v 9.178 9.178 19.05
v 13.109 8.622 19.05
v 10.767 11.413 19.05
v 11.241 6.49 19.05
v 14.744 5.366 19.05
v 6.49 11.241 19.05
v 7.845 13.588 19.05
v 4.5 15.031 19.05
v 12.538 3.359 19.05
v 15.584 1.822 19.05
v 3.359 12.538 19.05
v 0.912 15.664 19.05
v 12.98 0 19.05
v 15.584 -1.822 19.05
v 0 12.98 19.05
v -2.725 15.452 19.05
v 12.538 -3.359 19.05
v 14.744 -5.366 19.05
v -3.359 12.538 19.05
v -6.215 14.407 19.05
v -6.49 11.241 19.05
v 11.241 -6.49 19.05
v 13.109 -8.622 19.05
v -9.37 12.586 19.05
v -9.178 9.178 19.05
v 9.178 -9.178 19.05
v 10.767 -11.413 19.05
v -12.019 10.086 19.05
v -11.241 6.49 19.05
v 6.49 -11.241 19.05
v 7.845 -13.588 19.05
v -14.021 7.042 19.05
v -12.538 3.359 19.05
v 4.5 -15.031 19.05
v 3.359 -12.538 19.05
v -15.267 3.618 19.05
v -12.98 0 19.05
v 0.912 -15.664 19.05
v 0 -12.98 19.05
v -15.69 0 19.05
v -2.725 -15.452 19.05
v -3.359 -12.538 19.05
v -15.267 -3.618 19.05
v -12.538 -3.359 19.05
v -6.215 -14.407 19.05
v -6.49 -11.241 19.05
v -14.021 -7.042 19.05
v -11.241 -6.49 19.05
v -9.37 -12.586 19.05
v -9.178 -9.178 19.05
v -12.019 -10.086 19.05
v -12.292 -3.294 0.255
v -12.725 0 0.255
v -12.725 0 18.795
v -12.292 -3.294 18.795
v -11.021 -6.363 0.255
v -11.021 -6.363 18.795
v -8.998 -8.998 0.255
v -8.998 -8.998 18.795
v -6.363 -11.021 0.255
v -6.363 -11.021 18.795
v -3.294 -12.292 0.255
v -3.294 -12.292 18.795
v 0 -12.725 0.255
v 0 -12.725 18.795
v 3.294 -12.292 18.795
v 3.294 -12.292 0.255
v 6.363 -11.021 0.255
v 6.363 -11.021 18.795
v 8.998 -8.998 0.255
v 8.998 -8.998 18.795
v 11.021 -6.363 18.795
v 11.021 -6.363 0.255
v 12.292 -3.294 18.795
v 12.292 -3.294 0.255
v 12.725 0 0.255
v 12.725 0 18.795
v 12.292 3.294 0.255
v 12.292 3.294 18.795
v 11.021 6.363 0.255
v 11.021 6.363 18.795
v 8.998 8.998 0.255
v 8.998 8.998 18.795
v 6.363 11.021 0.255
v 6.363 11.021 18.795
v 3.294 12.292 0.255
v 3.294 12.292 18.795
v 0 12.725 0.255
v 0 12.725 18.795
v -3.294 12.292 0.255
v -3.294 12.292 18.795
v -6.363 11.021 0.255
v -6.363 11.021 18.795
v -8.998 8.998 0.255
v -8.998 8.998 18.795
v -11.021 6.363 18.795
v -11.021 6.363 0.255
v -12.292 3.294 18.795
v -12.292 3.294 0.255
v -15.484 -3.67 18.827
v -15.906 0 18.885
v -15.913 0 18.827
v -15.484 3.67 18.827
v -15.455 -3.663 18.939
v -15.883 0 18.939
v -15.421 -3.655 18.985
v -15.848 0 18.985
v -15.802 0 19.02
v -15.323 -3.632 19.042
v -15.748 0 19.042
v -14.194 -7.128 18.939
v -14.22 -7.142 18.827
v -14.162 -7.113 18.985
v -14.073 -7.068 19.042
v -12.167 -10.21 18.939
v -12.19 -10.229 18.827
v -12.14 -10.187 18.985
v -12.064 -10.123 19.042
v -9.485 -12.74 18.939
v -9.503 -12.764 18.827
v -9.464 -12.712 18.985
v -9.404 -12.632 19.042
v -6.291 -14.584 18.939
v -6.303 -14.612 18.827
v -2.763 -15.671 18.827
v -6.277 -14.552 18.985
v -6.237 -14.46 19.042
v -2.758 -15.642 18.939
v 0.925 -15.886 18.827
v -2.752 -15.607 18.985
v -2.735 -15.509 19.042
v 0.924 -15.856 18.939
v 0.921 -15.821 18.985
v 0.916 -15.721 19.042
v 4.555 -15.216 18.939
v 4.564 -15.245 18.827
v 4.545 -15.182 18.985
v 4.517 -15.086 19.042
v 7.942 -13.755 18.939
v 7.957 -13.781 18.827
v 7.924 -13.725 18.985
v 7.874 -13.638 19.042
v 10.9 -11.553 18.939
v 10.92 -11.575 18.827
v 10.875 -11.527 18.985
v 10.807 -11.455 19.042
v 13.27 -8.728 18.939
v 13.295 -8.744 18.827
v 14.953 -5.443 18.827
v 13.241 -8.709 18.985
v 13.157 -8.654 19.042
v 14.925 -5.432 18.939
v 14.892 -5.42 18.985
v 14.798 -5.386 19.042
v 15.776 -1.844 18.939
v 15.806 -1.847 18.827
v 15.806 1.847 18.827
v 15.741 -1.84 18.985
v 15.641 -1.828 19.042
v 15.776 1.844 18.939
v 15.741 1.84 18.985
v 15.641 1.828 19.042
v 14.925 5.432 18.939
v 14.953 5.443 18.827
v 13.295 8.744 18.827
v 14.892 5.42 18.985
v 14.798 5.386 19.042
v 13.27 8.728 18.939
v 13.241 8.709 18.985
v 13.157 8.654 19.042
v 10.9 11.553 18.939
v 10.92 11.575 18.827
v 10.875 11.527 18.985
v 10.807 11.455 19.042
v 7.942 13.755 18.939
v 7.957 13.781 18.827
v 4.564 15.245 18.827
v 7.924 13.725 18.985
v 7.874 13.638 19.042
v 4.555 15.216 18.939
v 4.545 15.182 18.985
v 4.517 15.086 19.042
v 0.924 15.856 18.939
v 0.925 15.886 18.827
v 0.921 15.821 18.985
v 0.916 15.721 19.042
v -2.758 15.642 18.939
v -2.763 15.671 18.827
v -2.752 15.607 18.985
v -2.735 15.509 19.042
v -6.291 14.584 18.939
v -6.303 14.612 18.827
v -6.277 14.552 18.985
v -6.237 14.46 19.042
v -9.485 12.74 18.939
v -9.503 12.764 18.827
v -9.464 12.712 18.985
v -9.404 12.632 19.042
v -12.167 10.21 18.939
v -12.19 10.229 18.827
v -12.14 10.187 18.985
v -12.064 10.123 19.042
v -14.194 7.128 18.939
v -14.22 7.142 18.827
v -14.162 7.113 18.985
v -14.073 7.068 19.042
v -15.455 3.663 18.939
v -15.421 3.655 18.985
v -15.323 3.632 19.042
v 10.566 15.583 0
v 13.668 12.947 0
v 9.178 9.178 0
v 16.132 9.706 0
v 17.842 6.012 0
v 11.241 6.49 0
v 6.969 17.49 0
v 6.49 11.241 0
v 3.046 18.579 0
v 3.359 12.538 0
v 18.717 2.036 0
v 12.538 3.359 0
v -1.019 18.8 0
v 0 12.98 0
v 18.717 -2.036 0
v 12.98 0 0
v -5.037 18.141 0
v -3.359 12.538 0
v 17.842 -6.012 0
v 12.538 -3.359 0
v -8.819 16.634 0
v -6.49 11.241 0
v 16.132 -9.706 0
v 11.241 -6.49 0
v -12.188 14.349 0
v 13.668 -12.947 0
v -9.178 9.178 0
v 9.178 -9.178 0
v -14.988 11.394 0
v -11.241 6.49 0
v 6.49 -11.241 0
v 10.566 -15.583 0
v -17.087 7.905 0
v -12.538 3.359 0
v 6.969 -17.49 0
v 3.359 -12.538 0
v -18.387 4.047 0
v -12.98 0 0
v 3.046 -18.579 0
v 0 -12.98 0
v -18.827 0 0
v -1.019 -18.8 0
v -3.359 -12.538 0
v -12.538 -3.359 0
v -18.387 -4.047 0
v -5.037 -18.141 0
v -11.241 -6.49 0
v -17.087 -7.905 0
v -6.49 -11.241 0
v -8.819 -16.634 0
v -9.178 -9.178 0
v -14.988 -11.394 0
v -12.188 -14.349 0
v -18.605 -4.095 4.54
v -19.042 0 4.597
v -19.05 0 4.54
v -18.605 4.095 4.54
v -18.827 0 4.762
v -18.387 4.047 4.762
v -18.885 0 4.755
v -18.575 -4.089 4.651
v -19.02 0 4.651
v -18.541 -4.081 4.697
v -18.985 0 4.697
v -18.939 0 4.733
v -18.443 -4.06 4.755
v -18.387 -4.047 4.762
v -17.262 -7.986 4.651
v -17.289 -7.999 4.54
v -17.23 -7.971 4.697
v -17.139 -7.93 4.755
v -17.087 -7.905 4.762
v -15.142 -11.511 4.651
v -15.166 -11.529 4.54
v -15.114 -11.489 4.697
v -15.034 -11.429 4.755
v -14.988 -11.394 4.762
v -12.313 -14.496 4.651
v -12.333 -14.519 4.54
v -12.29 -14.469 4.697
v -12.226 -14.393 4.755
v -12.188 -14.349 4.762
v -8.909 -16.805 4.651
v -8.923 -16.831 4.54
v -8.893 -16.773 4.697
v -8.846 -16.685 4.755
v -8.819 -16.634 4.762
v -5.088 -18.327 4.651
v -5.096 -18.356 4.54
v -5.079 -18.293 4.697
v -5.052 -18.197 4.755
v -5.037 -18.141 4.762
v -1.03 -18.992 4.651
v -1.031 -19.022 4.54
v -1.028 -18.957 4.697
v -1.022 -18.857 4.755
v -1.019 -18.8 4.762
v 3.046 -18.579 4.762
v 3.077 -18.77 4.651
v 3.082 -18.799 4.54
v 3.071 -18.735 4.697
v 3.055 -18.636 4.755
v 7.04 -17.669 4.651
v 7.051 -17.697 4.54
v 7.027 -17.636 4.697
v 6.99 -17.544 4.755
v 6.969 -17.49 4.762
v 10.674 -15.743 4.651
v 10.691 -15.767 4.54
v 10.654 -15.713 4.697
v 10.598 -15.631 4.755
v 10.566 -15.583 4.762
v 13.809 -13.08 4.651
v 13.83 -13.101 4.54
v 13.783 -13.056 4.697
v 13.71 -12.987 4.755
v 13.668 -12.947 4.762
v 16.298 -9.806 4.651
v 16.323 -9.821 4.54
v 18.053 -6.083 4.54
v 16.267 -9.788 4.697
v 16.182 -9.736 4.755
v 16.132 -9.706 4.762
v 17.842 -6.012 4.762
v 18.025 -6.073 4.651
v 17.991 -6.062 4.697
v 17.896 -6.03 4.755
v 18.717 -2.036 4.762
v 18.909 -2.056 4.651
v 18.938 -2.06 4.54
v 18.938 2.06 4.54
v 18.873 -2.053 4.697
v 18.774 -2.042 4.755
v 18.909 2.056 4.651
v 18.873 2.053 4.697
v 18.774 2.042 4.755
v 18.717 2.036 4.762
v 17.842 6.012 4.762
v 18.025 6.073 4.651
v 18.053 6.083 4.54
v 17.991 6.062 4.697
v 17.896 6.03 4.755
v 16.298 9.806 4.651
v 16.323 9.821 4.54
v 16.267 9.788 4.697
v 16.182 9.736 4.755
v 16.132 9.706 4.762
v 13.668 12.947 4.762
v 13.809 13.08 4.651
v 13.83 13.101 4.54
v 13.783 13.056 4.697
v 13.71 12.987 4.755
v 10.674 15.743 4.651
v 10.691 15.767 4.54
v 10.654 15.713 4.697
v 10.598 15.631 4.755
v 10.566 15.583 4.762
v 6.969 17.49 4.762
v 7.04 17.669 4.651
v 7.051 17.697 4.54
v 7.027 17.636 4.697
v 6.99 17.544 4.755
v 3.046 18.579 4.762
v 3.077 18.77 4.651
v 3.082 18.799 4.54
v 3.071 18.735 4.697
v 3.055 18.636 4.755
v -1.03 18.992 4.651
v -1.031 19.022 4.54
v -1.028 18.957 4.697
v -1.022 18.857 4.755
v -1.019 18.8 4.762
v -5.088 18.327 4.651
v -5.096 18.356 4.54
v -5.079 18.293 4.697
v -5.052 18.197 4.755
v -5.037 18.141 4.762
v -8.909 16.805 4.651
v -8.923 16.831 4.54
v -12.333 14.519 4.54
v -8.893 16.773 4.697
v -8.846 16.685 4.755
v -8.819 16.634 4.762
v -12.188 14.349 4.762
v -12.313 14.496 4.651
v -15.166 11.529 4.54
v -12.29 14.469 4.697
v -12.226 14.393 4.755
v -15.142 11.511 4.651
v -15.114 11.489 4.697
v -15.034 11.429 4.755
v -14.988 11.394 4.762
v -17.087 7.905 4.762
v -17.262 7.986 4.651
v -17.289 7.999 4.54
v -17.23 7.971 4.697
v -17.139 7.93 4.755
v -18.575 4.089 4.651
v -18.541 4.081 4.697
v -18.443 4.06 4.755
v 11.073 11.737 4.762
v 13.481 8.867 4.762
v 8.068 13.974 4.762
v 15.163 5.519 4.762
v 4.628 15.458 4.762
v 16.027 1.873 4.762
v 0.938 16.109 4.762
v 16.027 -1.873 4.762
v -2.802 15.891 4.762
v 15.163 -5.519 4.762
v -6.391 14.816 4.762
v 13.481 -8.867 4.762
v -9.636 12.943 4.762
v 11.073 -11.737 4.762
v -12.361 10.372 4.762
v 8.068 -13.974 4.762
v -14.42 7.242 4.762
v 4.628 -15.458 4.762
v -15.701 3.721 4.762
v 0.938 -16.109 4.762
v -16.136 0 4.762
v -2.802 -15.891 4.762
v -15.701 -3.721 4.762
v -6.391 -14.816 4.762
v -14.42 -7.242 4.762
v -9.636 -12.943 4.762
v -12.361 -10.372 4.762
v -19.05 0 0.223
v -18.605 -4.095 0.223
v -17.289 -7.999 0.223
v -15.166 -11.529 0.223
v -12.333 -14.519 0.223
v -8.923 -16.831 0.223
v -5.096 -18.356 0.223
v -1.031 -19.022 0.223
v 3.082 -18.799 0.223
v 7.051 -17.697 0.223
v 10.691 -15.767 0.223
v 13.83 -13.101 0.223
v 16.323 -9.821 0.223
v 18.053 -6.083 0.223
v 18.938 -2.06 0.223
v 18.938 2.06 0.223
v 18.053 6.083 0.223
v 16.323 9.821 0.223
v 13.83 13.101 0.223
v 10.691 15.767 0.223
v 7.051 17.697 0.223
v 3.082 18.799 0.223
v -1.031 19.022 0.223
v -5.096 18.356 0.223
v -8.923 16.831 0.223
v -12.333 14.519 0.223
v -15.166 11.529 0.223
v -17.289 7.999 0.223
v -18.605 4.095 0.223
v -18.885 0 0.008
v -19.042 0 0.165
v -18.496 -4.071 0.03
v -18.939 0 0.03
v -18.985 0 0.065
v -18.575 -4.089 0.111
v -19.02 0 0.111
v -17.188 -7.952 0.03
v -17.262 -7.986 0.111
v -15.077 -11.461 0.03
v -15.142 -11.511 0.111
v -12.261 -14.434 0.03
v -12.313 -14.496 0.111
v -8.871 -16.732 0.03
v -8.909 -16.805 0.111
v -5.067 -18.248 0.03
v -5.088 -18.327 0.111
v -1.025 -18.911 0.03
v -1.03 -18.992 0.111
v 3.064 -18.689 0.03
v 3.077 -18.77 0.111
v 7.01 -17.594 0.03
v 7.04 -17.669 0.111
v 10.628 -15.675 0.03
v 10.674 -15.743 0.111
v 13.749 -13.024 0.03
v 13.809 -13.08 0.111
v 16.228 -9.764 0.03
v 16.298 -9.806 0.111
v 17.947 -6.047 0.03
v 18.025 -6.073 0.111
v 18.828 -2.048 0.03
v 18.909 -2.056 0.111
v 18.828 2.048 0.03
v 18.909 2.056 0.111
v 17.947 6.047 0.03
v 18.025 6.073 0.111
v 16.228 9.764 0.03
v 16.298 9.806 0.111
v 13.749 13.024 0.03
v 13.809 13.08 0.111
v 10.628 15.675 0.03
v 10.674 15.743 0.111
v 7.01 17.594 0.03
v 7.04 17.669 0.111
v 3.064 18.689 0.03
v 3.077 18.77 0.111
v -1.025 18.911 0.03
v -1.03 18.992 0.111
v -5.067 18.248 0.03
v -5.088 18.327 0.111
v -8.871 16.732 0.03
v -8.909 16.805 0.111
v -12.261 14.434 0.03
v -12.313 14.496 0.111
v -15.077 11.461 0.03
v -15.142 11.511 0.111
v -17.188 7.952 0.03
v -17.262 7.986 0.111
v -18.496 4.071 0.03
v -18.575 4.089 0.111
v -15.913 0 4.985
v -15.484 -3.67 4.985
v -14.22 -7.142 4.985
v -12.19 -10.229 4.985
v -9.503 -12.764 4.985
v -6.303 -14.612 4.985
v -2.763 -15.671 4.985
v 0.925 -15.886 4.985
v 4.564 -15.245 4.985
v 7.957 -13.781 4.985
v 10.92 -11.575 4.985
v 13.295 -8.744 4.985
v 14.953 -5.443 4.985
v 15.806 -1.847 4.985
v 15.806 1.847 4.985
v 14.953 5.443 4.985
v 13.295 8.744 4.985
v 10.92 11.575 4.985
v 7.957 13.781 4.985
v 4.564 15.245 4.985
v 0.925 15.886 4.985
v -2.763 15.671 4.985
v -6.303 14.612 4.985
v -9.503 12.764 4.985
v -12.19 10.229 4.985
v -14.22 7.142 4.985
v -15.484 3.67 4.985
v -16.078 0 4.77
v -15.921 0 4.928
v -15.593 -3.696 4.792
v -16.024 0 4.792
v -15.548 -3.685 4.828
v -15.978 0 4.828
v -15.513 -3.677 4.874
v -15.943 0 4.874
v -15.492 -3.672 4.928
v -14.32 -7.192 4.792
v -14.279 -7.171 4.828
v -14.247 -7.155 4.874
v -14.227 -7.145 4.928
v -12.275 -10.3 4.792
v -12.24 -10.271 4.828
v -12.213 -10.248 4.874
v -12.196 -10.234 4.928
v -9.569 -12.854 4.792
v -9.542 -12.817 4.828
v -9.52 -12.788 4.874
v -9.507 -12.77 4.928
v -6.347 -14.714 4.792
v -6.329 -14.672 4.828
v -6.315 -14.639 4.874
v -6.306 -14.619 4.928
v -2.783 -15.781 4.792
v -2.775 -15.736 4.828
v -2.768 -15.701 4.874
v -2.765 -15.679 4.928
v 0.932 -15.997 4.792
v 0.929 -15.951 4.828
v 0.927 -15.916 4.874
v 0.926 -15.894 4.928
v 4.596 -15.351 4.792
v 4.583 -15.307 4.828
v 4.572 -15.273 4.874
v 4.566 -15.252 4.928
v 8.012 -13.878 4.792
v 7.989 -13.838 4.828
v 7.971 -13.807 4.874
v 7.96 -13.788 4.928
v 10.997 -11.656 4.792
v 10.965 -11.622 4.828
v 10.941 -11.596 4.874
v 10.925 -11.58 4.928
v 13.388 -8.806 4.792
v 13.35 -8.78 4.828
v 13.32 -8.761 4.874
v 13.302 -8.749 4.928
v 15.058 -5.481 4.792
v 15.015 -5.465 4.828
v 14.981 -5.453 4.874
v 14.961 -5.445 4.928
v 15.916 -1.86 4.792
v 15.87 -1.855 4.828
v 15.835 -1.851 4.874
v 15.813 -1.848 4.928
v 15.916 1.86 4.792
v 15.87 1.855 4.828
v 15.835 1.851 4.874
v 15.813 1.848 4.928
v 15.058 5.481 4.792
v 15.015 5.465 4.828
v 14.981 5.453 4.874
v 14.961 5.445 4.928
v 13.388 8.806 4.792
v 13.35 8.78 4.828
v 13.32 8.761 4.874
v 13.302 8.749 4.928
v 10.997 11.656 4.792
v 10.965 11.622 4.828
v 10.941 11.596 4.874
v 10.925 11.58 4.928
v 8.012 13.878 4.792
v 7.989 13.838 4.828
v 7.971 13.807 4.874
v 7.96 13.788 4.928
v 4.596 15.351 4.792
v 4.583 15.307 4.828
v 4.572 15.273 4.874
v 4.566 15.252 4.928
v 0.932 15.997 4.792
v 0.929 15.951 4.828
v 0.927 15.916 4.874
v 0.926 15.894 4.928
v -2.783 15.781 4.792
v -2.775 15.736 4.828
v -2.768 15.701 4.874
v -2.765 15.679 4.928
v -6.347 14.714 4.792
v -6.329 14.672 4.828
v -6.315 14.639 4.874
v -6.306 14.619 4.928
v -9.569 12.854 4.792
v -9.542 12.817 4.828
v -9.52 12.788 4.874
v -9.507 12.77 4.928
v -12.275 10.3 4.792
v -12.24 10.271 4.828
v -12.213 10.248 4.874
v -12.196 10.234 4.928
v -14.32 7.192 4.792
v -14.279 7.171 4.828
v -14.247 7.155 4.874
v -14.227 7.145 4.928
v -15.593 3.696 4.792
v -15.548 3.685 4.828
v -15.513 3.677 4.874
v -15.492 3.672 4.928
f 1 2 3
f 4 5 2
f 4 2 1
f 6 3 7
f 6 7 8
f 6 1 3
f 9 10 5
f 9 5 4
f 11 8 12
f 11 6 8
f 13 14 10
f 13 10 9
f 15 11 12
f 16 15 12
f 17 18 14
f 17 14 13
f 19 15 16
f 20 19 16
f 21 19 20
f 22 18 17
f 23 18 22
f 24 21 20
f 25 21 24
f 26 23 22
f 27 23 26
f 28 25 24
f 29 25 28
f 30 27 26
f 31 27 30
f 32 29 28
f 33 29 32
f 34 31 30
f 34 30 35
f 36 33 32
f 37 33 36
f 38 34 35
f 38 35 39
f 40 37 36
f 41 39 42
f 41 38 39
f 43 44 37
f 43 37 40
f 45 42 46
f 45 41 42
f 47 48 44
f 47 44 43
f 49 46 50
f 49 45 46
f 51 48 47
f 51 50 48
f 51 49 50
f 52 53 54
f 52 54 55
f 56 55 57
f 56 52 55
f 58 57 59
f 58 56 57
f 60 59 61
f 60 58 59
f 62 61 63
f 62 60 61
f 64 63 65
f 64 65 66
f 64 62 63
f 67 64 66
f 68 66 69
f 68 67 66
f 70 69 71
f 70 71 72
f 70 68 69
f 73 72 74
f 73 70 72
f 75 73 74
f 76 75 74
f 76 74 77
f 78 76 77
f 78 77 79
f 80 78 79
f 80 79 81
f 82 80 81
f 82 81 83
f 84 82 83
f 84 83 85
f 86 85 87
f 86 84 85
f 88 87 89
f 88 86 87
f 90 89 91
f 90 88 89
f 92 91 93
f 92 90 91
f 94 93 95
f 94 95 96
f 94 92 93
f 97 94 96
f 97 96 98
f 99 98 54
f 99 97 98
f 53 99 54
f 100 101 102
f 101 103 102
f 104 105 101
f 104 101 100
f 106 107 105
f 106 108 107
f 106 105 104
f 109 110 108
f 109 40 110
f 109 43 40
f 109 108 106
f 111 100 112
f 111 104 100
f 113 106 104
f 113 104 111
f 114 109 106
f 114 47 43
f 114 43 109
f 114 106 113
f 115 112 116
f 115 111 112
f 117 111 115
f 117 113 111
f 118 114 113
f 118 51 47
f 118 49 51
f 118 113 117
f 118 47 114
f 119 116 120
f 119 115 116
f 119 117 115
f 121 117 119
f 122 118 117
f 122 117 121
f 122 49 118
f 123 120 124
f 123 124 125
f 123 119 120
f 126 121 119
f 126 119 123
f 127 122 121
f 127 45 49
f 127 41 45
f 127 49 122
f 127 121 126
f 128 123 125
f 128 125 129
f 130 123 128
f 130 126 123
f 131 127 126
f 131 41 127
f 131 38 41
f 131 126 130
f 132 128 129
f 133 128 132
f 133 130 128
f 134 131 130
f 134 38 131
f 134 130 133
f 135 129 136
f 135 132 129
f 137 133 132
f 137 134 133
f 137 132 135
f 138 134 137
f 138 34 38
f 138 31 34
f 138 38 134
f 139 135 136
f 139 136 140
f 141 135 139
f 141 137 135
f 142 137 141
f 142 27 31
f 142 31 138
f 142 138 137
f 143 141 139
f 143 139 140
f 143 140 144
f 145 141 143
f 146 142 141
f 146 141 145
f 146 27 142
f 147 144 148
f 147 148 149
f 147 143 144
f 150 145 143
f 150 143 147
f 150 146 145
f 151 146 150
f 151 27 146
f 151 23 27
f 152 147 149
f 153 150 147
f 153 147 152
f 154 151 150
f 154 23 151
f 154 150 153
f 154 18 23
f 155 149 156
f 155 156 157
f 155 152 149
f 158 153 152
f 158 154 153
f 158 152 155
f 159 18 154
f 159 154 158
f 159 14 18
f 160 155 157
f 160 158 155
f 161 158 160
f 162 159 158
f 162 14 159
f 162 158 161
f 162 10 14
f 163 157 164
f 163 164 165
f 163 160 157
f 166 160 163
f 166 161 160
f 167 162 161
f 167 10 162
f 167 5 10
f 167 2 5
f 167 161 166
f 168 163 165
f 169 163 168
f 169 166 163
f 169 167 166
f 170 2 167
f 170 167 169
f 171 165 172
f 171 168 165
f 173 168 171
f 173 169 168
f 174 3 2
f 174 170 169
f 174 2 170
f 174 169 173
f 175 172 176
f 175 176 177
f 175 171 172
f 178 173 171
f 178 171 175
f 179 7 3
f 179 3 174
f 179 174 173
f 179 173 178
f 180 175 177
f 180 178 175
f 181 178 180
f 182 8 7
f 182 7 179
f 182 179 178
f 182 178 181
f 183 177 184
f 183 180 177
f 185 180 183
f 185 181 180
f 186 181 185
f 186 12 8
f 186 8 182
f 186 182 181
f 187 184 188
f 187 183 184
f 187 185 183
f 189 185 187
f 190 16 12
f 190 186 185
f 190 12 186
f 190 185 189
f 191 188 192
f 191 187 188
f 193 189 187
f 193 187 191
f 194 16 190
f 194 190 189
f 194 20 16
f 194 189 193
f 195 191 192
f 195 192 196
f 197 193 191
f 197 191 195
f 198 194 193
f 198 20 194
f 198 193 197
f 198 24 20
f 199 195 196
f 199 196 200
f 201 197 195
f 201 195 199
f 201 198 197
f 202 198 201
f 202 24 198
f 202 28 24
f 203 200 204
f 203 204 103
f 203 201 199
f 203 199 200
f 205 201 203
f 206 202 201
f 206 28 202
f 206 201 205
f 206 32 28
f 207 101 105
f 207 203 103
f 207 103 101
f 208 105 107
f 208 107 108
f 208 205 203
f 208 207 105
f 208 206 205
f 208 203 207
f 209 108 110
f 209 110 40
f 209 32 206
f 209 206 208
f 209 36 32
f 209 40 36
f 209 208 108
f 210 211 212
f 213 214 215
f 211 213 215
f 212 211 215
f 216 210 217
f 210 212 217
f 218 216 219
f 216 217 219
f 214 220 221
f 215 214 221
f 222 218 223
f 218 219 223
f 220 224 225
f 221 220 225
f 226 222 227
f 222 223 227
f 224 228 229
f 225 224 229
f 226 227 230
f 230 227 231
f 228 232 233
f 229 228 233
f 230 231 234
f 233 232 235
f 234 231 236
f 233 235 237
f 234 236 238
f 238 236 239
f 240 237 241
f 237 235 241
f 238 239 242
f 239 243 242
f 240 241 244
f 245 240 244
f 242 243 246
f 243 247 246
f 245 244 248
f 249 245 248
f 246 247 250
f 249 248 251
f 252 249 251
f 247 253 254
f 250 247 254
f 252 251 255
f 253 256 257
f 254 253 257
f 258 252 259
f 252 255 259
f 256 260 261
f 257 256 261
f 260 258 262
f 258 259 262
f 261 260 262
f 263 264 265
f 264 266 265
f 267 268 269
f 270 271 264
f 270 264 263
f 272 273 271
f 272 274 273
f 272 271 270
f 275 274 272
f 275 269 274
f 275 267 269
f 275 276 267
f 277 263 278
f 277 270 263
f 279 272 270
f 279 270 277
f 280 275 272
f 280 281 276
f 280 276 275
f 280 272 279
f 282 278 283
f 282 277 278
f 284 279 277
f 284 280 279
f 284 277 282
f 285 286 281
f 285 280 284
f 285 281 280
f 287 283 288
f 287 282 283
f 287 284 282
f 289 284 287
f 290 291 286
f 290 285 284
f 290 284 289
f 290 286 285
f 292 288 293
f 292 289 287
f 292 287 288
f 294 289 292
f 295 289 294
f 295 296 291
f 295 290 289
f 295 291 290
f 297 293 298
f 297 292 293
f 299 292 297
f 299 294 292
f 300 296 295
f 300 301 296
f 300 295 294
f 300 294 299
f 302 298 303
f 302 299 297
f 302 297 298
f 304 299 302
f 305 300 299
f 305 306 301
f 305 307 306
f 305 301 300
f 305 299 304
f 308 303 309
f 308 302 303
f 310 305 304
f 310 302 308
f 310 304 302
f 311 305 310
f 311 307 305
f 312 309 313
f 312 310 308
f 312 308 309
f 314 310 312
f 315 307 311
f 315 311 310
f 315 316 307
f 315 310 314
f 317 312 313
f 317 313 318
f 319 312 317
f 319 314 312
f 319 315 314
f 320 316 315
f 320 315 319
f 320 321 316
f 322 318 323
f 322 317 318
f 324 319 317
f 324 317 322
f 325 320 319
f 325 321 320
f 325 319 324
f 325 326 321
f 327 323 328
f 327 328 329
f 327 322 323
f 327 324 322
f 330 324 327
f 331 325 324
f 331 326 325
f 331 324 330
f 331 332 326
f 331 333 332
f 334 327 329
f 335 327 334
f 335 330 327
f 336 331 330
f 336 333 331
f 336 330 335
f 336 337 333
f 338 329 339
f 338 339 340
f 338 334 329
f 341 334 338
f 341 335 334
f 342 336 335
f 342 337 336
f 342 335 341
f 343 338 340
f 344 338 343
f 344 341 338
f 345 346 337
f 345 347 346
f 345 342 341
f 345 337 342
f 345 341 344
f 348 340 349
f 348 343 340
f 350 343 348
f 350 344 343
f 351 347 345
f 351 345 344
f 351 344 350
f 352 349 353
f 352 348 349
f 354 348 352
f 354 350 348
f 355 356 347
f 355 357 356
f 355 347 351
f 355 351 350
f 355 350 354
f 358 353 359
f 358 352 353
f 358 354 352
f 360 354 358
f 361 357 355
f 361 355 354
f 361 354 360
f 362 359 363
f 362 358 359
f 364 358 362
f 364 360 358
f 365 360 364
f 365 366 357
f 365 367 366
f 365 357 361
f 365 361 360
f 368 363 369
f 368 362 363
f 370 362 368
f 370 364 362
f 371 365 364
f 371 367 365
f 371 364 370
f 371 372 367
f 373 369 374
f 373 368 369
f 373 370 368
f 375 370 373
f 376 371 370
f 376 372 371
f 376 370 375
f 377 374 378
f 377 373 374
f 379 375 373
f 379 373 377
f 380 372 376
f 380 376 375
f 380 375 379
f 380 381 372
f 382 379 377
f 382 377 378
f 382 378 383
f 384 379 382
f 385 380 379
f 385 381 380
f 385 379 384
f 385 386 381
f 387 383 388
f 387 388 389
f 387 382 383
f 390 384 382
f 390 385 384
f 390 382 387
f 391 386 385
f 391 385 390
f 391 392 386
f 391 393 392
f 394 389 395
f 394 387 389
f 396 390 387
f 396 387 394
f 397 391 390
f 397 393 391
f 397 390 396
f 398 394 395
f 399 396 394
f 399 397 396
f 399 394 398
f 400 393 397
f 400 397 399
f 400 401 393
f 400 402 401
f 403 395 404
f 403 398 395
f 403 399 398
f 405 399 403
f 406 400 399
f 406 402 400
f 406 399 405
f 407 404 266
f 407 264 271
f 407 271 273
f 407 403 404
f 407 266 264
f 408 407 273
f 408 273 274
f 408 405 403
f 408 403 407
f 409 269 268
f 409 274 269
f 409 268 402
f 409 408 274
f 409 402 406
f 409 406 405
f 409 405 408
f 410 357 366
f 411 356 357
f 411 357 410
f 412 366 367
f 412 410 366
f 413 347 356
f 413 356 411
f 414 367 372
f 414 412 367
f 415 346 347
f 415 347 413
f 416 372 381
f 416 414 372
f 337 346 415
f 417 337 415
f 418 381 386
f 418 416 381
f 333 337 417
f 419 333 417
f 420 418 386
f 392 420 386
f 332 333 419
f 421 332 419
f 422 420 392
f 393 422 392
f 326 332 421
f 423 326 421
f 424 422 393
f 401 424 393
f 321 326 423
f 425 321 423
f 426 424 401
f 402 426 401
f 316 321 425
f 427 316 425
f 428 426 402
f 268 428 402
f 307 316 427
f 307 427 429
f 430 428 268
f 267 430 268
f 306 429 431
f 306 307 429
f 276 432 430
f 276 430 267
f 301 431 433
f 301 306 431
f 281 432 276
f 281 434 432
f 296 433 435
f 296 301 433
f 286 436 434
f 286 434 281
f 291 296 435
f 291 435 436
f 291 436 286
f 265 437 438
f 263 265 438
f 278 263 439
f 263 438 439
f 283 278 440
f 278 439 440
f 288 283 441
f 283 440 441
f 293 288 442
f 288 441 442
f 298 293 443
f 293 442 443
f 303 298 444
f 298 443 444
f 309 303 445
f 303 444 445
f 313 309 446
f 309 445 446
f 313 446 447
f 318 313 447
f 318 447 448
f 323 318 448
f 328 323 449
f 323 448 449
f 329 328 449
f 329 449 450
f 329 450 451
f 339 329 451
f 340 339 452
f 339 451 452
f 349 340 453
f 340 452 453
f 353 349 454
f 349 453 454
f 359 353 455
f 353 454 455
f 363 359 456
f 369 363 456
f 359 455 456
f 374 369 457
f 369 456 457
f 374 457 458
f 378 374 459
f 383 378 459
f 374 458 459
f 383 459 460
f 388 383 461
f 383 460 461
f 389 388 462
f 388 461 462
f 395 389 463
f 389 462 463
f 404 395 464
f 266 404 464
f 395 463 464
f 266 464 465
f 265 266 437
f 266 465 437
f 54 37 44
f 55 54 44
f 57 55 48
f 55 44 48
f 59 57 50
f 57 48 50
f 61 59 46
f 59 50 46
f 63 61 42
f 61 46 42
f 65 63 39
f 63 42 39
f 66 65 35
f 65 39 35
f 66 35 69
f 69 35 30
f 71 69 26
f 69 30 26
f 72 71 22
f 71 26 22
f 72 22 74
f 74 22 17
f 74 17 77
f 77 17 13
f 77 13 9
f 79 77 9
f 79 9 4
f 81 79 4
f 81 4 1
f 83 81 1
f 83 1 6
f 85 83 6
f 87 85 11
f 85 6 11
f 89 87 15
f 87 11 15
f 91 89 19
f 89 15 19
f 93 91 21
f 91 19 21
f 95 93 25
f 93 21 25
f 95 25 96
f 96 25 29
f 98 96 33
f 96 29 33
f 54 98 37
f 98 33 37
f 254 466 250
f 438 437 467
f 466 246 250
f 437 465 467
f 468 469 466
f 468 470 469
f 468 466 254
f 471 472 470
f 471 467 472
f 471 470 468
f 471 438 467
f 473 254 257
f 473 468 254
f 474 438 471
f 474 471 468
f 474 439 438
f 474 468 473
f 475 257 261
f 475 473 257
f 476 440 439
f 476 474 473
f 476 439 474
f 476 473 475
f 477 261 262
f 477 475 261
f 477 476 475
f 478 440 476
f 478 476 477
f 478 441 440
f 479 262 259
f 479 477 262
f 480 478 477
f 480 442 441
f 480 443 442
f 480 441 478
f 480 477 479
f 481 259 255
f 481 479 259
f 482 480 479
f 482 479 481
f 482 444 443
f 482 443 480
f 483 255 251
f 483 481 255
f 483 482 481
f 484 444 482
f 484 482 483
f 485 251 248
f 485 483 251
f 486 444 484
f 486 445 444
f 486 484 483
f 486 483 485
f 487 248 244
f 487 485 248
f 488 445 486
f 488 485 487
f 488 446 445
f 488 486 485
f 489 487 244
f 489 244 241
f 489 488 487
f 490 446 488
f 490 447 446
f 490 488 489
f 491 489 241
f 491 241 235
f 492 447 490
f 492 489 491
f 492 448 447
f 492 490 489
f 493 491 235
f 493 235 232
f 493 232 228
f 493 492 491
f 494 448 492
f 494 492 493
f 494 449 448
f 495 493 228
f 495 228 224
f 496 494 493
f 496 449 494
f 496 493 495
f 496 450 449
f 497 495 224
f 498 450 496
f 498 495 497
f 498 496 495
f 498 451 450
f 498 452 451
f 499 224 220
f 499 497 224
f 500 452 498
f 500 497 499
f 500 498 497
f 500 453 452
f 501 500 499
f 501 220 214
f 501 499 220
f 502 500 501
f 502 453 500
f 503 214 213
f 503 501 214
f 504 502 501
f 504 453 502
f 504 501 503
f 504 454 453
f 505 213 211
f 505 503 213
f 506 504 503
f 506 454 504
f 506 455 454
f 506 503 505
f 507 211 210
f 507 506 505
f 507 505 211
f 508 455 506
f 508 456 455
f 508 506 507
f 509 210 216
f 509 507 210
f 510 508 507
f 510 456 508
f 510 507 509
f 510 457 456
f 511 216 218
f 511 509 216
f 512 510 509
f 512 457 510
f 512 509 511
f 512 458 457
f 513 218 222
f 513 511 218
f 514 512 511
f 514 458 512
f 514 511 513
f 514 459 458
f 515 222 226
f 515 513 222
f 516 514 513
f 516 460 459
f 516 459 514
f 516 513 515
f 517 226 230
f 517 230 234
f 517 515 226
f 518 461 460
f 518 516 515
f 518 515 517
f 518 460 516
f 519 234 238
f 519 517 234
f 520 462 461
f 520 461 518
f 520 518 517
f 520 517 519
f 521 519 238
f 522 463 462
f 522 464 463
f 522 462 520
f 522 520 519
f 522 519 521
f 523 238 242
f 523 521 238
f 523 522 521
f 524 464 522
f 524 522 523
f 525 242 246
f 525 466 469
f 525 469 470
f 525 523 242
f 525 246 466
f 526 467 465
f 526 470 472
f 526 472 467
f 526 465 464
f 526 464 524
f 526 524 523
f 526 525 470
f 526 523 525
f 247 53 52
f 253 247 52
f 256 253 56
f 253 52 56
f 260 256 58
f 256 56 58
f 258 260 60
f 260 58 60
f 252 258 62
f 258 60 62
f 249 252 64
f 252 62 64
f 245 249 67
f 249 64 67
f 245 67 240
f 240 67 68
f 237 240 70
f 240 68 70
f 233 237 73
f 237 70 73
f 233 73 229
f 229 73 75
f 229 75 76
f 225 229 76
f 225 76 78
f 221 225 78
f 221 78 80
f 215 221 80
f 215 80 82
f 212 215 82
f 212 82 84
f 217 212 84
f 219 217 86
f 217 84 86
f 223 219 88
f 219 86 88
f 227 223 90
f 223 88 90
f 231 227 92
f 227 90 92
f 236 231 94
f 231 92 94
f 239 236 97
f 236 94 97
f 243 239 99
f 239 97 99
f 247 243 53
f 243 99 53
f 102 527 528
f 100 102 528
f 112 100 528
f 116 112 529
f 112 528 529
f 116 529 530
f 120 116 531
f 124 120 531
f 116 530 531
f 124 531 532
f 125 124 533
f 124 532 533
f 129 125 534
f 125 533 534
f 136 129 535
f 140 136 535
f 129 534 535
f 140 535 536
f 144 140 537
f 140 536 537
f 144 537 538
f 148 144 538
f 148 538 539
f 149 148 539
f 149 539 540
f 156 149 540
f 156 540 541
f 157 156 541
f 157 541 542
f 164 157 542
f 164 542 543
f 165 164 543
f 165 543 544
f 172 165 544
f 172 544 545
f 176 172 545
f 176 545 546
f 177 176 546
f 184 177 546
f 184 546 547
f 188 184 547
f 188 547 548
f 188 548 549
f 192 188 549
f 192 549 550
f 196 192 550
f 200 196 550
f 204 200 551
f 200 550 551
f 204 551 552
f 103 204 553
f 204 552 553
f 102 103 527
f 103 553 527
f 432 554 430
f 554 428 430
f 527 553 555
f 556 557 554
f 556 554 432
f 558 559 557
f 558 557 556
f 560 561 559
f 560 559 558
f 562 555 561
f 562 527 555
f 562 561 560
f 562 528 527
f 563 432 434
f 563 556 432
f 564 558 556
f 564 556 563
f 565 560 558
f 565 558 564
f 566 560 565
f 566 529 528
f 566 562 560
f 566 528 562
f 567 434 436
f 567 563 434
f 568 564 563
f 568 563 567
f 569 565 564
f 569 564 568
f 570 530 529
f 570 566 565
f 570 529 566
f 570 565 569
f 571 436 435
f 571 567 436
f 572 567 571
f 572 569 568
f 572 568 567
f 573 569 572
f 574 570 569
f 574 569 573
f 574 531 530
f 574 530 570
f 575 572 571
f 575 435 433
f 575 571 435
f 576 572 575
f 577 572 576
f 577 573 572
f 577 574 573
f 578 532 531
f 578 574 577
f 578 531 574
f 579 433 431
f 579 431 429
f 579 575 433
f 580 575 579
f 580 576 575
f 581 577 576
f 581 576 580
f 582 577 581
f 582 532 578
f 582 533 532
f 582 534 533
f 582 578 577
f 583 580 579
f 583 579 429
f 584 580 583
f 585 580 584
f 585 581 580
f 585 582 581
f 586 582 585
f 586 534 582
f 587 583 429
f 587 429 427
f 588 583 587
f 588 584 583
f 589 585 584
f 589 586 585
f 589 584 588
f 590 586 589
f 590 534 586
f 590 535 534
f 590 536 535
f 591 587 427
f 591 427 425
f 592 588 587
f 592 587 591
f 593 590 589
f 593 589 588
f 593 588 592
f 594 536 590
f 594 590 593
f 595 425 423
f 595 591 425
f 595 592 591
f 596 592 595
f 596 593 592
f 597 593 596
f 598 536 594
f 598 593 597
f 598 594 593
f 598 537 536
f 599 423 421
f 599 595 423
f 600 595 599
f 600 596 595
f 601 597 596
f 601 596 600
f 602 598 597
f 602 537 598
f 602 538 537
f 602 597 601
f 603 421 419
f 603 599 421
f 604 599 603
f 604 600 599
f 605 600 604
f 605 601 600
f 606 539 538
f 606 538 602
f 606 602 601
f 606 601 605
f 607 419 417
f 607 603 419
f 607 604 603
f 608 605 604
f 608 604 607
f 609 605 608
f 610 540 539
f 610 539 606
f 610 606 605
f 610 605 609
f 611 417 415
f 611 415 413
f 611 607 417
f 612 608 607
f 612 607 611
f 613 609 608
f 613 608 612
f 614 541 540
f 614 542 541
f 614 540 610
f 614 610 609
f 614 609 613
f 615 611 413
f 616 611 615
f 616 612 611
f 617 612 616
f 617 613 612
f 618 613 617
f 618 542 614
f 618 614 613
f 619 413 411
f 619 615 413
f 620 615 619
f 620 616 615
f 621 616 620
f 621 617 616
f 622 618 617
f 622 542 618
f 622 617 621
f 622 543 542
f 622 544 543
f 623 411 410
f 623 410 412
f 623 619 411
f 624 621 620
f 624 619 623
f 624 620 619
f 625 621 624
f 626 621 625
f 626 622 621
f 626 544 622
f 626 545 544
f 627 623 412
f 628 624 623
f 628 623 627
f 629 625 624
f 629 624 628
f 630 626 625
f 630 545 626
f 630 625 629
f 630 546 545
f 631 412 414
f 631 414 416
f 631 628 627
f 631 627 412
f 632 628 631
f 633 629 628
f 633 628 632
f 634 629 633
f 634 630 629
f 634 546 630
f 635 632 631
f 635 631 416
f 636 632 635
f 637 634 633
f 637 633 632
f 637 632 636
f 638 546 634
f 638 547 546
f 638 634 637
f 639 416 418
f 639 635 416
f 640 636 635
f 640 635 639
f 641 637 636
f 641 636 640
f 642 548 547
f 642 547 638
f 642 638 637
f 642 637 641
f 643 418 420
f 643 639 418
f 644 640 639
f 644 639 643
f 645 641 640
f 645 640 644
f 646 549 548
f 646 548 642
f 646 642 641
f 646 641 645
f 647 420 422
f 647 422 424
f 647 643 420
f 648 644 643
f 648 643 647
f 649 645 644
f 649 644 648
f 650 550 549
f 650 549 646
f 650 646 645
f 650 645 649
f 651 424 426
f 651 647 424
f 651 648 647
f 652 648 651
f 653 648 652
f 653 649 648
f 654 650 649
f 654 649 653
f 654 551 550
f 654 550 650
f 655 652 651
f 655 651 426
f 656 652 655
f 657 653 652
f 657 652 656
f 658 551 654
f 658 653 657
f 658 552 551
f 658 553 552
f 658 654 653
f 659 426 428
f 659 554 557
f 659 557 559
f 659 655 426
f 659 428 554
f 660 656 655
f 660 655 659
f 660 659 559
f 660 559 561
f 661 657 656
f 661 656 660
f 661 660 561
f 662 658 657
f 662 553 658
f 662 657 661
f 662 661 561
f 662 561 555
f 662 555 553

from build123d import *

# Parameters (mm, degrees)
SKETCH3_R           = 15.9131
SKETCH3_R_2         = 12.7254
BOSS_EXTRUDE1_DEPTH = 19.05
SKETCH4_R           = 19.05
SKETCH4_R_2         = 15.9131
BOSS_EXTRUDE2_DEPTH = 4.7625
CHAMFER1_SIZE       = 0.254508
FILLET1_R           = 0.2227834


with BuildPart() as part:
    # Sketch3 → Boss-Extrude1 (new body)
    with BuildSketch(Plane.XY):
        with Locations(Location((0, 0, 0), (0, 0, 180))):
            Circle(SKETCH3_R)
        with Locations(Location((0, 0, 0), (0, 0, 180))):
            Circle(SKETCH3_R_2, mode=Mode.SUBTRACT)
    extrude(amount=BOSS_EXTRUDE1_DEPTH)

    # Sketch4 → Boss-Extrude2 (add)
    with BuildSketch(Plane.XY):
        with Locations(Location((0, 0, 0), (0, 0, 180))):
            Circle(SKETCH4_R)
        with Locations(Location((0, 0, 0), (0, 0, 180))):
            Circle(SKETCH4_R_2, mode=Mode.SUBTRACT)
    extrude(amount=BOSS_EXTRUDE2_DEPTH)

    # Chamfer1
    chamfer1_edges = [part.edges().sort_by_distance(p)[0] for p in [
        (12.7254, 0, 0),
        (12.7254, 0, 19.05),
    ]]
    chamfer(chamfer1_edges, length=CHAMFER1_SIZE)

    # Fillet1
    fillet1_edges = [part.edges().sort_by_distance(p)[0] for p in [
        (19.05, 0, 4.7625),
        (19.05, 0, 0),
        (15.9131, 0, 4.7625),
        (15.9131, 0, 19.05),
    ]]
    fillet(fillet1_edges, radius=FILLET1_R)


solid = part.part
